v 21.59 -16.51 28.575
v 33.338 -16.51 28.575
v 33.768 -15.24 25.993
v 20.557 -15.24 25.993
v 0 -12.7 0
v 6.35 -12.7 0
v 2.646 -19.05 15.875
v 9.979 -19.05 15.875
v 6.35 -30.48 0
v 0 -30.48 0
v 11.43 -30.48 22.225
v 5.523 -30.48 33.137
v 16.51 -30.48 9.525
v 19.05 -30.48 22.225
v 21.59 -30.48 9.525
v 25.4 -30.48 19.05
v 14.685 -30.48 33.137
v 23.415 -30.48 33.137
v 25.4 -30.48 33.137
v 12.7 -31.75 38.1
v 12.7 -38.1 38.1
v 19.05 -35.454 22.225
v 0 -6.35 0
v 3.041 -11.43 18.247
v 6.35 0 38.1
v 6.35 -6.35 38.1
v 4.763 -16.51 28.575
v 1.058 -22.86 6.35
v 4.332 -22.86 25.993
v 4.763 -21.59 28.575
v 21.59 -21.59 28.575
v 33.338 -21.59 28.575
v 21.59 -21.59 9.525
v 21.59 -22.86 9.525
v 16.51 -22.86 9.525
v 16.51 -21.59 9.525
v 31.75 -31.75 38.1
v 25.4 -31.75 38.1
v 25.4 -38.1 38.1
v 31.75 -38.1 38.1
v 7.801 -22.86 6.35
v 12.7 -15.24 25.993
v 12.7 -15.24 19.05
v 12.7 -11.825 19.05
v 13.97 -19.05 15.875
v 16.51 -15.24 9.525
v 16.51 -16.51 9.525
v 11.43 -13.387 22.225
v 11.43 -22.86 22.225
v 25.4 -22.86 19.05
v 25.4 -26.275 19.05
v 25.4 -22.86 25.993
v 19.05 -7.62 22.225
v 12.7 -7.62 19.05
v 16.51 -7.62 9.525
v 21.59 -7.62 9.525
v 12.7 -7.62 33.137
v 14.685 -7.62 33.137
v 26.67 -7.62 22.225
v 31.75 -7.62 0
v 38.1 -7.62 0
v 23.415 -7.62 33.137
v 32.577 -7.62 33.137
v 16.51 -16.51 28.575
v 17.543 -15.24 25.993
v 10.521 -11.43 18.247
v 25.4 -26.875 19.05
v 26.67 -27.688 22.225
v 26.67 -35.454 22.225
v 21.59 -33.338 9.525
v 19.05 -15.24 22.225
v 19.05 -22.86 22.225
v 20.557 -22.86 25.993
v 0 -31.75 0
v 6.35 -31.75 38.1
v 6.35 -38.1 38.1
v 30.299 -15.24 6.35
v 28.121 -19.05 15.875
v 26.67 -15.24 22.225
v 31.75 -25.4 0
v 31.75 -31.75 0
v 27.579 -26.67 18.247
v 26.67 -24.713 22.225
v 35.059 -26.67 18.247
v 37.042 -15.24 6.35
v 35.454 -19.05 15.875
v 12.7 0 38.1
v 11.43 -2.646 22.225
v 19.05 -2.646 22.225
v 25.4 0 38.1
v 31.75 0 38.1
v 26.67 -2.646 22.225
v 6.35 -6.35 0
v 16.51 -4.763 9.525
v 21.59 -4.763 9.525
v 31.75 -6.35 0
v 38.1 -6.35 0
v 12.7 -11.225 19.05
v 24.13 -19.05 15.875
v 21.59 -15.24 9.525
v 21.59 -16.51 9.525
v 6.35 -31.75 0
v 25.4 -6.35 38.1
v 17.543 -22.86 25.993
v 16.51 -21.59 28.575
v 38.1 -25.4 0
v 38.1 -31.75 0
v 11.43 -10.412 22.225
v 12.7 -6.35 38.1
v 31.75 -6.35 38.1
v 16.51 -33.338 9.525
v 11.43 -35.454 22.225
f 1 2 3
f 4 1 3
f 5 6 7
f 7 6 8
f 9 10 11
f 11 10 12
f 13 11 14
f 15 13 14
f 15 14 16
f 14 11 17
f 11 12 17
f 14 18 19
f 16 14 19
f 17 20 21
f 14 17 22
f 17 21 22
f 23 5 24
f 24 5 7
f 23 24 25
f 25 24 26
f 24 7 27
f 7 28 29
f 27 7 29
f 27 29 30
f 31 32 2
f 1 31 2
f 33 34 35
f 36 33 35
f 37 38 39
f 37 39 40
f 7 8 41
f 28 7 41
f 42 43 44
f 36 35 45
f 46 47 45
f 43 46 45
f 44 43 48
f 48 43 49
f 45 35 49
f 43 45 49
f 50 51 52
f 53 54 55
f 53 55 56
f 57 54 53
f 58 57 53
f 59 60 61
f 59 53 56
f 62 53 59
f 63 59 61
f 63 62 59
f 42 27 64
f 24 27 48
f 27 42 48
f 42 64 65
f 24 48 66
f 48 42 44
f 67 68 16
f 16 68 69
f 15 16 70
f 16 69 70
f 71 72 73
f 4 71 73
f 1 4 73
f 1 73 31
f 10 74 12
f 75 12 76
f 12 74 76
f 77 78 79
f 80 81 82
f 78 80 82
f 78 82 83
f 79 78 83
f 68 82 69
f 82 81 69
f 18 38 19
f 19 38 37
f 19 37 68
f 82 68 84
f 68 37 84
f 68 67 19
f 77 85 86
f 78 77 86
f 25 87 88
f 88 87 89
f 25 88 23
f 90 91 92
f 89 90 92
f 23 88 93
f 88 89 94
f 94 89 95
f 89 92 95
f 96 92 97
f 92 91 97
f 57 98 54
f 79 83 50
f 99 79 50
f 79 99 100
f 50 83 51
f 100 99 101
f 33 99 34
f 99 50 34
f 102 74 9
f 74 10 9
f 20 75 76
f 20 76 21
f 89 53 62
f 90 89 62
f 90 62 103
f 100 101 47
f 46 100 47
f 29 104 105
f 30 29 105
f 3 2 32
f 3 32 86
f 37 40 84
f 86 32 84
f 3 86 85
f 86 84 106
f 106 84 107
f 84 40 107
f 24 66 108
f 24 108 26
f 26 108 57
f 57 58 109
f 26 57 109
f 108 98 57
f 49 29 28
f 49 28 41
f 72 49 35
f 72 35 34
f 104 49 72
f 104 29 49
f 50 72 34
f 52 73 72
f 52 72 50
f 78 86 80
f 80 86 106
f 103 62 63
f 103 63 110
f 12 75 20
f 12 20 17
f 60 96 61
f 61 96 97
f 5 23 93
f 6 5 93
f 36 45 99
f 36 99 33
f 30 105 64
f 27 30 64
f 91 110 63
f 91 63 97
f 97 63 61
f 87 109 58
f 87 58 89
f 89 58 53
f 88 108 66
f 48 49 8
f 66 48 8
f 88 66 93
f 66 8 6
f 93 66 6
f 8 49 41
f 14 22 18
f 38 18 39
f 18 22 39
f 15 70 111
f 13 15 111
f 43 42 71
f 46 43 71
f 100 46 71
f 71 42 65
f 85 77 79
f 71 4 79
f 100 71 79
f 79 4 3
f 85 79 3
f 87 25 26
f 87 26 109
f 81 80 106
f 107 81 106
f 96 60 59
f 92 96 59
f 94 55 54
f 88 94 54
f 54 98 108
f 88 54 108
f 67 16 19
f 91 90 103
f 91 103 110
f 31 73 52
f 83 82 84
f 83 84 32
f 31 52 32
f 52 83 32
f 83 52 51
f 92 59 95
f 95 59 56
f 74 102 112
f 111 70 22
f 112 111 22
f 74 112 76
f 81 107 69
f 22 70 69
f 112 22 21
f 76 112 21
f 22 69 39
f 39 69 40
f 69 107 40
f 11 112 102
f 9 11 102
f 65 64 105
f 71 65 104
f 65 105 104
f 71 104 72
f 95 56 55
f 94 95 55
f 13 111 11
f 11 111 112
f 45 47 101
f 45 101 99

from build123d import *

# Parameters (mm, degrees)
F0_W     = 38.1
F0_H     = 38.1
F1_DEPTH = 38.1
F5_DEPTH = 38.1
F7_DEPTH = 38.1
F8_W     = 25.4
F8_H     = 7.62
F9_DEPTH = 38.1


with BuildPart() as f1:
    # F0 (on Front) → F1 (new body)
    with BuildSketch(Plane.XZ):
        with Locations((19.05, 19.05)):
            Rectangle(F0_W, F0_H)
    extrude(amount=F1_DEPTH)

    # F4 (on face) → F5 (cut)
    with BuildSketch(Plane.YZ.offset(38.1)):
        Polygon((-11.43, 18.247465), (-6.35, 38.1), (-31.75, 38.1), (-26.67, 18.247465), (-21.59, 28.575), (-16.51, 28.575), align=None)
        Polygon((-6.35, 0), (0, 0), (0, 38.1), align=None)
        Polygon((-25.4, 0), (-12.7, 0), (-19.05, 15.875), align=None)
        Polygon((-38.1, 0), (-31.75, 0), (-38.1, 38.1), align=None)
    extrude(amount=-F5_DEPTH, mode=Mode.SUBTRACT)

    # F6 (on offset) → F7 (cut)
    with BuildSketch(Plane.XZ.offset(38.1)):
        Polygon((25.4, 38.1), (12.7, 38.1), (19.05, 22.225), align=None)
        Polygon((11.43, 22.225), (6.35, 0), (31.75, 0), (26.67, 22.225), (21.59, 9.525), (16.51, 9.525), align=None)
        Polygon((0, 38.1), (0, 0), (6.35, 38.1), align=None)
        Polygon((31.75, 38.1), (38.1, 0), (38.1, 38.1), align=None)
    extrude(amount=-F7_DEPTH, mode=Mode.SUBTRACT)

    # F8 (on offset) → F9 (cut)
    with BuildSketch(Plane.XY.offset(38.1)):
        with Locations((25.4, -11.43)):
            Rectangle(F8_W, F8_H)
        with Locations((12.7, -26.67)):
            Rectangle(F8_W, F8_H)
    extrude(amount=-F9_DEPTH, mode=Mode.SUBTRACT)


solid = f1.part
